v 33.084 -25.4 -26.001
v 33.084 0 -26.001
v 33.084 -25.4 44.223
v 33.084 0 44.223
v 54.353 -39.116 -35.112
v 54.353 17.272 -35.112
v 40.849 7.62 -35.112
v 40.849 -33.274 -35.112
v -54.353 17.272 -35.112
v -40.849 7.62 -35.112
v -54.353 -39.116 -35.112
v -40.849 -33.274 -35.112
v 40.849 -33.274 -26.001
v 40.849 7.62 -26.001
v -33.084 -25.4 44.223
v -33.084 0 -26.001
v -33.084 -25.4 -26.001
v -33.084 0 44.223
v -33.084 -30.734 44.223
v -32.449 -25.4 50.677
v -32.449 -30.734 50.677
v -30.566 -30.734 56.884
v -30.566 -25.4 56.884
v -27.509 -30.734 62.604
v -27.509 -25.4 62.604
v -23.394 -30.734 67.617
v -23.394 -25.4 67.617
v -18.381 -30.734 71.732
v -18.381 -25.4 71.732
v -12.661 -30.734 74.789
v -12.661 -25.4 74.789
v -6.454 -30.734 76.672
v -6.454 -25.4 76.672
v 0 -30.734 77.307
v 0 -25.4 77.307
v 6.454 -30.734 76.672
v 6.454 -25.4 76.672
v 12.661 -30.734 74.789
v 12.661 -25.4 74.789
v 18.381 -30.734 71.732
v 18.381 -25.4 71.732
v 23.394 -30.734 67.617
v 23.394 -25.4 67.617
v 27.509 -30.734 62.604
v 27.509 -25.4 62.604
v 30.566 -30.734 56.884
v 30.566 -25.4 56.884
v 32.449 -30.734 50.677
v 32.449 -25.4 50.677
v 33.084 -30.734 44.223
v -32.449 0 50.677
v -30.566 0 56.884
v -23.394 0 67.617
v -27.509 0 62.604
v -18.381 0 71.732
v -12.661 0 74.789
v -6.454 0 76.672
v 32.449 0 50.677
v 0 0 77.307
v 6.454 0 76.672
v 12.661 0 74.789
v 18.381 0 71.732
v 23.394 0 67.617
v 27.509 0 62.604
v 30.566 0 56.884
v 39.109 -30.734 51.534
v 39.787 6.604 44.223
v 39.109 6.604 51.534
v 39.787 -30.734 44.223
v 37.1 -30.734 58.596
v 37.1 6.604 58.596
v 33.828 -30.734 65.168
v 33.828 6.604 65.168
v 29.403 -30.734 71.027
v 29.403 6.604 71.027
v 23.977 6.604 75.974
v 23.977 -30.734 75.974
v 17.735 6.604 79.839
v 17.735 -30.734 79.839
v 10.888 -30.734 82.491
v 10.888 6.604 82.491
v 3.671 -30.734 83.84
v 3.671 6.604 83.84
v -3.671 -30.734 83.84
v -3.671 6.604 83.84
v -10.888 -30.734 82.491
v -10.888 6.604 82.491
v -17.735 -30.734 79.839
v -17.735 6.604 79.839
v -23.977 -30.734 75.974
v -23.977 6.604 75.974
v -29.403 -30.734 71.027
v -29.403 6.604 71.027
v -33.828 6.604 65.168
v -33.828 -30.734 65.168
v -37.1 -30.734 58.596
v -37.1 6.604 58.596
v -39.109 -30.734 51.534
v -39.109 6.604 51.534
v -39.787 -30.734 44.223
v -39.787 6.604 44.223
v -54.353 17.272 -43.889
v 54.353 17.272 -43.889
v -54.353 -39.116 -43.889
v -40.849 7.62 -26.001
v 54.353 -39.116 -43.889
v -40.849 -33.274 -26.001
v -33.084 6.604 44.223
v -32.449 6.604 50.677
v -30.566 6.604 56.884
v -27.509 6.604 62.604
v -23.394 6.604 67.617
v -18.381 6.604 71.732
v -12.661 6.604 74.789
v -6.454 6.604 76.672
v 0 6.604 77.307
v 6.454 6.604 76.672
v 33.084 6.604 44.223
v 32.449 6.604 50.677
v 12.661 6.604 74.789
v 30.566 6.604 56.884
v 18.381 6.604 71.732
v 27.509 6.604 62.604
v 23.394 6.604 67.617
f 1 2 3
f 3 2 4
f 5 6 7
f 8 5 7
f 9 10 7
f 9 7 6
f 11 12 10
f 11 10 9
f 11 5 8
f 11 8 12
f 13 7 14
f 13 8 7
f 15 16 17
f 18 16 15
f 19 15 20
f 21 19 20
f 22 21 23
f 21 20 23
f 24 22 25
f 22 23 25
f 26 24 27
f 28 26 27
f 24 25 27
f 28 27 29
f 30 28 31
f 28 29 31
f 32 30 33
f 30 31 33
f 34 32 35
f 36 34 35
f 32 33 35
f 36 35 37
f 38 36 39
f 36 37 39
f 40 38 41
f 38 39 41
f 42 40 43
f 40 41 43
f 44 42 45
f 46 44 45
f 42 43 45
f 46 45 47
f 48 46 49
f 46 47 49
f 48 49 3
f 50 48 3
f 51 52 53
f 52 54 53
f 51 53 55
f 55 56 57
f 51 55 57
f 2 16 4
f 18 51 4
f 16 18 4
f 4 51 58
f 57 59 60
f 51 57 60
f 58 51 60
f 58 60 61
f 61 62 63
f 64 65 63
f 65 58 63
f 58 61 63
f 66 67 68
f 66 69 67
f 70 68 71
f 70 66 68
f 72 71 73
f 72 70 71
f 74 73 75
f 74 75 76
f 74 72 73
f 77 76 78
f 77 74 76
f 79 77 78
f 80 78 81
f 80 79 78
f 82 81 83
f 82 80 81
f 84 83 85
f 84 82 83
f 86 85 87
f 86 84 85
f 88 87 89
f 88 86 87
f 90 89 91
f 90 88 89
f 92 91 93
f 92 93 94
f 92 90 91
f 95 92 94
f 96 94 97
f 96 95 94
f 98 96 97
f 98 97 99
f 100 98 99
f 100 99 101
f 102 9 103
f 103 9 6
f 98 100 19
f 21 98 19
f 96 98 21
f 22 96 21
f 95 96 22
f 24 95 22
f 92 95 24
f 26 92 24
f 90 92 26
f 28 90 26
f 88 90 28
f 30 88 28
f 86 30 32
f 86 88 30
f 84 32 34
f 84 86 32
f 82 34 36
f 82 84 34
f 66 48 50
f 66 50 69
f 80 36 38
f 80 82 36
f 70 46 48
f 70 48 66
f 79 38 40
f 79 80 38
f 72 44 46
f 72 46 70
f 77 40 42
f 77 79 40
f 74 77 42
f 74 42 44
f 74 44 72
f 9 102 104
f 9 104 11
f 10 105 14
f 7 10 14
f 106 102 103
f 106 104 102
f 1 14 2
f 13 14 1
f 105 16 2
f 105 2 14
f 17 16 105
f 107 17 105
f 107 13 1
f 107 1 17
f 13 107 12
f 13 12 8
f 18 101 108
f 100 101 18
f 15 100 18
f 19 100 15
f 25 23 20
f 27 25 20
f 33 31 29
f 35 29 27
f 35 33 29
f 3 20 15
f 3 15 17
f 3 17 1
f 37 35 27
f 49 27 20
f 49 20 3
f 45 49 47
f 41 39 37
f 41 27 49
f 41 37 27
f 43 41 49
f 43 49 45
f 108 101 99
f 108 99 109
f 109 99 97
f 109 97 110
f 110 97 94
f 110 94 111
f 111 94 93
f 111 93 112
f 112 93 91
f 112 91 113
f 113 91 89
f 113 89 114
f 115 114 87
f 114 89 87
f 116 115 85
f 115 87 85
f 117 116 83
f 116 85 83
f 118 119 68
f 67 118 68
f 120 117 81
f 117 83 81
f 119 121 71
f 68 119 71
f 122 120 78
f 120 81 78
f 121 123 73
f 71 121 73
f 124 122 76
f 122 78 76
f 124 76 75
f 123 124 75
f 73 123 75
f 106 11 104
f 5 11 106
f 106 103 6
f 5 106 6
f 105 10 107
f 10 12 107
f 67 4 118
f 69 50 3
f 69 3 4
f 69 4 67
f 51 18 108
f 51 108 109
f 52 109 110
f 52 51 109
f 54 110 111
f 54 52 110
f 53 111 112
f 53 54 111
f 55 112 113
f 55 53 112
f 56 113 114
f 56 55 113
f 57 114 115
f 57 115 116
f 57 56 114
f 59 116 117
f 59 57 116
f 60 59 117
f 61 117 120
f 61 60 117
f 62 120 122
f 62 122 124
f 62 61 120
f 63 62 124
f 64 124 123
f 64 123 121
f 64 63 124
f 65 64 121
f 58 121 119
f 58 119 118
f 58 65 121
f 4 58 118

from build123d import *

# Parameters (mm, degrees)
F0_W          = 66.1686062813
F0_H          = 70.2235847712
F1_DEPTH      = 25.4
F2_DEPTH      = 30.734
F2_DEPTH_BACK = 6.604
F0_W_2        = 7.764685899
F0_H_2        = 9.111225605
F3_DEPTH      = 33.274
F3_DEPTH_BACK = 7.62
F0_W_3        = 13.5037973523
F0_H_3        = 8.7774693966
F4_DEPTH      = 39.116
F4_DEPTH_BACK = 17.272


with BuildPart() as f1:
    # F0 (on Front) → F1 (new body)
    with BuildSketch(Plane.XZ):
        with BuildLine():
            ThreePointArc((33.0843031406, 44.2230179906), (0, 77.3073211312), (-33.0843031406, 44.2230179906))
            Line((-33.0843031406, 44.2230179906), (33.0843031406, 44.2230179906))
        make_face()
        with Locations((0, 9.111225605)):
            Rectangle(F0_W, F0_H)
    extrude(amount=F1_DEPTH)

    # F0 (on Front) → F2 (join, two sides)
    with BuildSketch(Plane.XZ) as f2_sk:
        with BuildLine():
            Line((-39.7869050503, 44.2230179906), (-33.0843031406, 44.2230179906))
            ThreePointArc((-33.0843031406, 44.2230179906), (0, 77.3073211312), (33.0843031406, 44.2230179906))
            Line((33.0843031406, 44.2230179906), (39.7869050503, 44.2230179906))
            ThreePointArc((39.7869050503, 44.2230179906), (0, 84.0099230409), (-39.7869050503, 44.2230179906))
        make_face()
    extrude(amount=F2_DEPTH)
    extrude(f2_sk.sketch, amount=-F2_DEPTH_BACK)

    # F0 (on Front) → F3 (join, two sides)
    with BuildSketch(Plane.XZ) as f3_sk:
        with Locations((36.9666460901, -30.5561795831)):
            Rectangle(F0_W_2, F0_H_2)
        with Locations((0, -30.5561795831)):
            Rectangle(F0_W, F0_H_2)
        with Locations((-36.9666460901, -30.5561795831)):
            Rectangle(F0_W_2, F0_H_2)
    extrude(amount=F3_DEPTH)
    extrude(f3_sk.sketch, amount=-F3_DEPTH_BACK)

    # F0 (on Front) → F4 (join, two sides)
    with BuildSketch(Plane.XZ) as f4_sk:
        with Locations((47.6008877158, -39.5005270839)):
            Rectangle(F0_W_3, F0_H_3)
        with Locations((36.9666460901, -39.5005270839)):
            Rectangle(F0_W_2, F0_H_3)
        with Locations((0, -39.5005270839)):
            Rectangle(F0_W, F0_H_3)
        with Locations((-36.9666460901, -39.5005270839)):
            Rectangle(F0_W_2, F0_H_3)
        with Locations((-47.6008877158, -39.5005270839)):
            Rectangle(F0_W_3, F0_H_3)
    extrude(amount=F4_DEPTH)
    extrude(f4_sk.sketch, amount=-F4_DEPTH_BACK)


solid = f1.part
